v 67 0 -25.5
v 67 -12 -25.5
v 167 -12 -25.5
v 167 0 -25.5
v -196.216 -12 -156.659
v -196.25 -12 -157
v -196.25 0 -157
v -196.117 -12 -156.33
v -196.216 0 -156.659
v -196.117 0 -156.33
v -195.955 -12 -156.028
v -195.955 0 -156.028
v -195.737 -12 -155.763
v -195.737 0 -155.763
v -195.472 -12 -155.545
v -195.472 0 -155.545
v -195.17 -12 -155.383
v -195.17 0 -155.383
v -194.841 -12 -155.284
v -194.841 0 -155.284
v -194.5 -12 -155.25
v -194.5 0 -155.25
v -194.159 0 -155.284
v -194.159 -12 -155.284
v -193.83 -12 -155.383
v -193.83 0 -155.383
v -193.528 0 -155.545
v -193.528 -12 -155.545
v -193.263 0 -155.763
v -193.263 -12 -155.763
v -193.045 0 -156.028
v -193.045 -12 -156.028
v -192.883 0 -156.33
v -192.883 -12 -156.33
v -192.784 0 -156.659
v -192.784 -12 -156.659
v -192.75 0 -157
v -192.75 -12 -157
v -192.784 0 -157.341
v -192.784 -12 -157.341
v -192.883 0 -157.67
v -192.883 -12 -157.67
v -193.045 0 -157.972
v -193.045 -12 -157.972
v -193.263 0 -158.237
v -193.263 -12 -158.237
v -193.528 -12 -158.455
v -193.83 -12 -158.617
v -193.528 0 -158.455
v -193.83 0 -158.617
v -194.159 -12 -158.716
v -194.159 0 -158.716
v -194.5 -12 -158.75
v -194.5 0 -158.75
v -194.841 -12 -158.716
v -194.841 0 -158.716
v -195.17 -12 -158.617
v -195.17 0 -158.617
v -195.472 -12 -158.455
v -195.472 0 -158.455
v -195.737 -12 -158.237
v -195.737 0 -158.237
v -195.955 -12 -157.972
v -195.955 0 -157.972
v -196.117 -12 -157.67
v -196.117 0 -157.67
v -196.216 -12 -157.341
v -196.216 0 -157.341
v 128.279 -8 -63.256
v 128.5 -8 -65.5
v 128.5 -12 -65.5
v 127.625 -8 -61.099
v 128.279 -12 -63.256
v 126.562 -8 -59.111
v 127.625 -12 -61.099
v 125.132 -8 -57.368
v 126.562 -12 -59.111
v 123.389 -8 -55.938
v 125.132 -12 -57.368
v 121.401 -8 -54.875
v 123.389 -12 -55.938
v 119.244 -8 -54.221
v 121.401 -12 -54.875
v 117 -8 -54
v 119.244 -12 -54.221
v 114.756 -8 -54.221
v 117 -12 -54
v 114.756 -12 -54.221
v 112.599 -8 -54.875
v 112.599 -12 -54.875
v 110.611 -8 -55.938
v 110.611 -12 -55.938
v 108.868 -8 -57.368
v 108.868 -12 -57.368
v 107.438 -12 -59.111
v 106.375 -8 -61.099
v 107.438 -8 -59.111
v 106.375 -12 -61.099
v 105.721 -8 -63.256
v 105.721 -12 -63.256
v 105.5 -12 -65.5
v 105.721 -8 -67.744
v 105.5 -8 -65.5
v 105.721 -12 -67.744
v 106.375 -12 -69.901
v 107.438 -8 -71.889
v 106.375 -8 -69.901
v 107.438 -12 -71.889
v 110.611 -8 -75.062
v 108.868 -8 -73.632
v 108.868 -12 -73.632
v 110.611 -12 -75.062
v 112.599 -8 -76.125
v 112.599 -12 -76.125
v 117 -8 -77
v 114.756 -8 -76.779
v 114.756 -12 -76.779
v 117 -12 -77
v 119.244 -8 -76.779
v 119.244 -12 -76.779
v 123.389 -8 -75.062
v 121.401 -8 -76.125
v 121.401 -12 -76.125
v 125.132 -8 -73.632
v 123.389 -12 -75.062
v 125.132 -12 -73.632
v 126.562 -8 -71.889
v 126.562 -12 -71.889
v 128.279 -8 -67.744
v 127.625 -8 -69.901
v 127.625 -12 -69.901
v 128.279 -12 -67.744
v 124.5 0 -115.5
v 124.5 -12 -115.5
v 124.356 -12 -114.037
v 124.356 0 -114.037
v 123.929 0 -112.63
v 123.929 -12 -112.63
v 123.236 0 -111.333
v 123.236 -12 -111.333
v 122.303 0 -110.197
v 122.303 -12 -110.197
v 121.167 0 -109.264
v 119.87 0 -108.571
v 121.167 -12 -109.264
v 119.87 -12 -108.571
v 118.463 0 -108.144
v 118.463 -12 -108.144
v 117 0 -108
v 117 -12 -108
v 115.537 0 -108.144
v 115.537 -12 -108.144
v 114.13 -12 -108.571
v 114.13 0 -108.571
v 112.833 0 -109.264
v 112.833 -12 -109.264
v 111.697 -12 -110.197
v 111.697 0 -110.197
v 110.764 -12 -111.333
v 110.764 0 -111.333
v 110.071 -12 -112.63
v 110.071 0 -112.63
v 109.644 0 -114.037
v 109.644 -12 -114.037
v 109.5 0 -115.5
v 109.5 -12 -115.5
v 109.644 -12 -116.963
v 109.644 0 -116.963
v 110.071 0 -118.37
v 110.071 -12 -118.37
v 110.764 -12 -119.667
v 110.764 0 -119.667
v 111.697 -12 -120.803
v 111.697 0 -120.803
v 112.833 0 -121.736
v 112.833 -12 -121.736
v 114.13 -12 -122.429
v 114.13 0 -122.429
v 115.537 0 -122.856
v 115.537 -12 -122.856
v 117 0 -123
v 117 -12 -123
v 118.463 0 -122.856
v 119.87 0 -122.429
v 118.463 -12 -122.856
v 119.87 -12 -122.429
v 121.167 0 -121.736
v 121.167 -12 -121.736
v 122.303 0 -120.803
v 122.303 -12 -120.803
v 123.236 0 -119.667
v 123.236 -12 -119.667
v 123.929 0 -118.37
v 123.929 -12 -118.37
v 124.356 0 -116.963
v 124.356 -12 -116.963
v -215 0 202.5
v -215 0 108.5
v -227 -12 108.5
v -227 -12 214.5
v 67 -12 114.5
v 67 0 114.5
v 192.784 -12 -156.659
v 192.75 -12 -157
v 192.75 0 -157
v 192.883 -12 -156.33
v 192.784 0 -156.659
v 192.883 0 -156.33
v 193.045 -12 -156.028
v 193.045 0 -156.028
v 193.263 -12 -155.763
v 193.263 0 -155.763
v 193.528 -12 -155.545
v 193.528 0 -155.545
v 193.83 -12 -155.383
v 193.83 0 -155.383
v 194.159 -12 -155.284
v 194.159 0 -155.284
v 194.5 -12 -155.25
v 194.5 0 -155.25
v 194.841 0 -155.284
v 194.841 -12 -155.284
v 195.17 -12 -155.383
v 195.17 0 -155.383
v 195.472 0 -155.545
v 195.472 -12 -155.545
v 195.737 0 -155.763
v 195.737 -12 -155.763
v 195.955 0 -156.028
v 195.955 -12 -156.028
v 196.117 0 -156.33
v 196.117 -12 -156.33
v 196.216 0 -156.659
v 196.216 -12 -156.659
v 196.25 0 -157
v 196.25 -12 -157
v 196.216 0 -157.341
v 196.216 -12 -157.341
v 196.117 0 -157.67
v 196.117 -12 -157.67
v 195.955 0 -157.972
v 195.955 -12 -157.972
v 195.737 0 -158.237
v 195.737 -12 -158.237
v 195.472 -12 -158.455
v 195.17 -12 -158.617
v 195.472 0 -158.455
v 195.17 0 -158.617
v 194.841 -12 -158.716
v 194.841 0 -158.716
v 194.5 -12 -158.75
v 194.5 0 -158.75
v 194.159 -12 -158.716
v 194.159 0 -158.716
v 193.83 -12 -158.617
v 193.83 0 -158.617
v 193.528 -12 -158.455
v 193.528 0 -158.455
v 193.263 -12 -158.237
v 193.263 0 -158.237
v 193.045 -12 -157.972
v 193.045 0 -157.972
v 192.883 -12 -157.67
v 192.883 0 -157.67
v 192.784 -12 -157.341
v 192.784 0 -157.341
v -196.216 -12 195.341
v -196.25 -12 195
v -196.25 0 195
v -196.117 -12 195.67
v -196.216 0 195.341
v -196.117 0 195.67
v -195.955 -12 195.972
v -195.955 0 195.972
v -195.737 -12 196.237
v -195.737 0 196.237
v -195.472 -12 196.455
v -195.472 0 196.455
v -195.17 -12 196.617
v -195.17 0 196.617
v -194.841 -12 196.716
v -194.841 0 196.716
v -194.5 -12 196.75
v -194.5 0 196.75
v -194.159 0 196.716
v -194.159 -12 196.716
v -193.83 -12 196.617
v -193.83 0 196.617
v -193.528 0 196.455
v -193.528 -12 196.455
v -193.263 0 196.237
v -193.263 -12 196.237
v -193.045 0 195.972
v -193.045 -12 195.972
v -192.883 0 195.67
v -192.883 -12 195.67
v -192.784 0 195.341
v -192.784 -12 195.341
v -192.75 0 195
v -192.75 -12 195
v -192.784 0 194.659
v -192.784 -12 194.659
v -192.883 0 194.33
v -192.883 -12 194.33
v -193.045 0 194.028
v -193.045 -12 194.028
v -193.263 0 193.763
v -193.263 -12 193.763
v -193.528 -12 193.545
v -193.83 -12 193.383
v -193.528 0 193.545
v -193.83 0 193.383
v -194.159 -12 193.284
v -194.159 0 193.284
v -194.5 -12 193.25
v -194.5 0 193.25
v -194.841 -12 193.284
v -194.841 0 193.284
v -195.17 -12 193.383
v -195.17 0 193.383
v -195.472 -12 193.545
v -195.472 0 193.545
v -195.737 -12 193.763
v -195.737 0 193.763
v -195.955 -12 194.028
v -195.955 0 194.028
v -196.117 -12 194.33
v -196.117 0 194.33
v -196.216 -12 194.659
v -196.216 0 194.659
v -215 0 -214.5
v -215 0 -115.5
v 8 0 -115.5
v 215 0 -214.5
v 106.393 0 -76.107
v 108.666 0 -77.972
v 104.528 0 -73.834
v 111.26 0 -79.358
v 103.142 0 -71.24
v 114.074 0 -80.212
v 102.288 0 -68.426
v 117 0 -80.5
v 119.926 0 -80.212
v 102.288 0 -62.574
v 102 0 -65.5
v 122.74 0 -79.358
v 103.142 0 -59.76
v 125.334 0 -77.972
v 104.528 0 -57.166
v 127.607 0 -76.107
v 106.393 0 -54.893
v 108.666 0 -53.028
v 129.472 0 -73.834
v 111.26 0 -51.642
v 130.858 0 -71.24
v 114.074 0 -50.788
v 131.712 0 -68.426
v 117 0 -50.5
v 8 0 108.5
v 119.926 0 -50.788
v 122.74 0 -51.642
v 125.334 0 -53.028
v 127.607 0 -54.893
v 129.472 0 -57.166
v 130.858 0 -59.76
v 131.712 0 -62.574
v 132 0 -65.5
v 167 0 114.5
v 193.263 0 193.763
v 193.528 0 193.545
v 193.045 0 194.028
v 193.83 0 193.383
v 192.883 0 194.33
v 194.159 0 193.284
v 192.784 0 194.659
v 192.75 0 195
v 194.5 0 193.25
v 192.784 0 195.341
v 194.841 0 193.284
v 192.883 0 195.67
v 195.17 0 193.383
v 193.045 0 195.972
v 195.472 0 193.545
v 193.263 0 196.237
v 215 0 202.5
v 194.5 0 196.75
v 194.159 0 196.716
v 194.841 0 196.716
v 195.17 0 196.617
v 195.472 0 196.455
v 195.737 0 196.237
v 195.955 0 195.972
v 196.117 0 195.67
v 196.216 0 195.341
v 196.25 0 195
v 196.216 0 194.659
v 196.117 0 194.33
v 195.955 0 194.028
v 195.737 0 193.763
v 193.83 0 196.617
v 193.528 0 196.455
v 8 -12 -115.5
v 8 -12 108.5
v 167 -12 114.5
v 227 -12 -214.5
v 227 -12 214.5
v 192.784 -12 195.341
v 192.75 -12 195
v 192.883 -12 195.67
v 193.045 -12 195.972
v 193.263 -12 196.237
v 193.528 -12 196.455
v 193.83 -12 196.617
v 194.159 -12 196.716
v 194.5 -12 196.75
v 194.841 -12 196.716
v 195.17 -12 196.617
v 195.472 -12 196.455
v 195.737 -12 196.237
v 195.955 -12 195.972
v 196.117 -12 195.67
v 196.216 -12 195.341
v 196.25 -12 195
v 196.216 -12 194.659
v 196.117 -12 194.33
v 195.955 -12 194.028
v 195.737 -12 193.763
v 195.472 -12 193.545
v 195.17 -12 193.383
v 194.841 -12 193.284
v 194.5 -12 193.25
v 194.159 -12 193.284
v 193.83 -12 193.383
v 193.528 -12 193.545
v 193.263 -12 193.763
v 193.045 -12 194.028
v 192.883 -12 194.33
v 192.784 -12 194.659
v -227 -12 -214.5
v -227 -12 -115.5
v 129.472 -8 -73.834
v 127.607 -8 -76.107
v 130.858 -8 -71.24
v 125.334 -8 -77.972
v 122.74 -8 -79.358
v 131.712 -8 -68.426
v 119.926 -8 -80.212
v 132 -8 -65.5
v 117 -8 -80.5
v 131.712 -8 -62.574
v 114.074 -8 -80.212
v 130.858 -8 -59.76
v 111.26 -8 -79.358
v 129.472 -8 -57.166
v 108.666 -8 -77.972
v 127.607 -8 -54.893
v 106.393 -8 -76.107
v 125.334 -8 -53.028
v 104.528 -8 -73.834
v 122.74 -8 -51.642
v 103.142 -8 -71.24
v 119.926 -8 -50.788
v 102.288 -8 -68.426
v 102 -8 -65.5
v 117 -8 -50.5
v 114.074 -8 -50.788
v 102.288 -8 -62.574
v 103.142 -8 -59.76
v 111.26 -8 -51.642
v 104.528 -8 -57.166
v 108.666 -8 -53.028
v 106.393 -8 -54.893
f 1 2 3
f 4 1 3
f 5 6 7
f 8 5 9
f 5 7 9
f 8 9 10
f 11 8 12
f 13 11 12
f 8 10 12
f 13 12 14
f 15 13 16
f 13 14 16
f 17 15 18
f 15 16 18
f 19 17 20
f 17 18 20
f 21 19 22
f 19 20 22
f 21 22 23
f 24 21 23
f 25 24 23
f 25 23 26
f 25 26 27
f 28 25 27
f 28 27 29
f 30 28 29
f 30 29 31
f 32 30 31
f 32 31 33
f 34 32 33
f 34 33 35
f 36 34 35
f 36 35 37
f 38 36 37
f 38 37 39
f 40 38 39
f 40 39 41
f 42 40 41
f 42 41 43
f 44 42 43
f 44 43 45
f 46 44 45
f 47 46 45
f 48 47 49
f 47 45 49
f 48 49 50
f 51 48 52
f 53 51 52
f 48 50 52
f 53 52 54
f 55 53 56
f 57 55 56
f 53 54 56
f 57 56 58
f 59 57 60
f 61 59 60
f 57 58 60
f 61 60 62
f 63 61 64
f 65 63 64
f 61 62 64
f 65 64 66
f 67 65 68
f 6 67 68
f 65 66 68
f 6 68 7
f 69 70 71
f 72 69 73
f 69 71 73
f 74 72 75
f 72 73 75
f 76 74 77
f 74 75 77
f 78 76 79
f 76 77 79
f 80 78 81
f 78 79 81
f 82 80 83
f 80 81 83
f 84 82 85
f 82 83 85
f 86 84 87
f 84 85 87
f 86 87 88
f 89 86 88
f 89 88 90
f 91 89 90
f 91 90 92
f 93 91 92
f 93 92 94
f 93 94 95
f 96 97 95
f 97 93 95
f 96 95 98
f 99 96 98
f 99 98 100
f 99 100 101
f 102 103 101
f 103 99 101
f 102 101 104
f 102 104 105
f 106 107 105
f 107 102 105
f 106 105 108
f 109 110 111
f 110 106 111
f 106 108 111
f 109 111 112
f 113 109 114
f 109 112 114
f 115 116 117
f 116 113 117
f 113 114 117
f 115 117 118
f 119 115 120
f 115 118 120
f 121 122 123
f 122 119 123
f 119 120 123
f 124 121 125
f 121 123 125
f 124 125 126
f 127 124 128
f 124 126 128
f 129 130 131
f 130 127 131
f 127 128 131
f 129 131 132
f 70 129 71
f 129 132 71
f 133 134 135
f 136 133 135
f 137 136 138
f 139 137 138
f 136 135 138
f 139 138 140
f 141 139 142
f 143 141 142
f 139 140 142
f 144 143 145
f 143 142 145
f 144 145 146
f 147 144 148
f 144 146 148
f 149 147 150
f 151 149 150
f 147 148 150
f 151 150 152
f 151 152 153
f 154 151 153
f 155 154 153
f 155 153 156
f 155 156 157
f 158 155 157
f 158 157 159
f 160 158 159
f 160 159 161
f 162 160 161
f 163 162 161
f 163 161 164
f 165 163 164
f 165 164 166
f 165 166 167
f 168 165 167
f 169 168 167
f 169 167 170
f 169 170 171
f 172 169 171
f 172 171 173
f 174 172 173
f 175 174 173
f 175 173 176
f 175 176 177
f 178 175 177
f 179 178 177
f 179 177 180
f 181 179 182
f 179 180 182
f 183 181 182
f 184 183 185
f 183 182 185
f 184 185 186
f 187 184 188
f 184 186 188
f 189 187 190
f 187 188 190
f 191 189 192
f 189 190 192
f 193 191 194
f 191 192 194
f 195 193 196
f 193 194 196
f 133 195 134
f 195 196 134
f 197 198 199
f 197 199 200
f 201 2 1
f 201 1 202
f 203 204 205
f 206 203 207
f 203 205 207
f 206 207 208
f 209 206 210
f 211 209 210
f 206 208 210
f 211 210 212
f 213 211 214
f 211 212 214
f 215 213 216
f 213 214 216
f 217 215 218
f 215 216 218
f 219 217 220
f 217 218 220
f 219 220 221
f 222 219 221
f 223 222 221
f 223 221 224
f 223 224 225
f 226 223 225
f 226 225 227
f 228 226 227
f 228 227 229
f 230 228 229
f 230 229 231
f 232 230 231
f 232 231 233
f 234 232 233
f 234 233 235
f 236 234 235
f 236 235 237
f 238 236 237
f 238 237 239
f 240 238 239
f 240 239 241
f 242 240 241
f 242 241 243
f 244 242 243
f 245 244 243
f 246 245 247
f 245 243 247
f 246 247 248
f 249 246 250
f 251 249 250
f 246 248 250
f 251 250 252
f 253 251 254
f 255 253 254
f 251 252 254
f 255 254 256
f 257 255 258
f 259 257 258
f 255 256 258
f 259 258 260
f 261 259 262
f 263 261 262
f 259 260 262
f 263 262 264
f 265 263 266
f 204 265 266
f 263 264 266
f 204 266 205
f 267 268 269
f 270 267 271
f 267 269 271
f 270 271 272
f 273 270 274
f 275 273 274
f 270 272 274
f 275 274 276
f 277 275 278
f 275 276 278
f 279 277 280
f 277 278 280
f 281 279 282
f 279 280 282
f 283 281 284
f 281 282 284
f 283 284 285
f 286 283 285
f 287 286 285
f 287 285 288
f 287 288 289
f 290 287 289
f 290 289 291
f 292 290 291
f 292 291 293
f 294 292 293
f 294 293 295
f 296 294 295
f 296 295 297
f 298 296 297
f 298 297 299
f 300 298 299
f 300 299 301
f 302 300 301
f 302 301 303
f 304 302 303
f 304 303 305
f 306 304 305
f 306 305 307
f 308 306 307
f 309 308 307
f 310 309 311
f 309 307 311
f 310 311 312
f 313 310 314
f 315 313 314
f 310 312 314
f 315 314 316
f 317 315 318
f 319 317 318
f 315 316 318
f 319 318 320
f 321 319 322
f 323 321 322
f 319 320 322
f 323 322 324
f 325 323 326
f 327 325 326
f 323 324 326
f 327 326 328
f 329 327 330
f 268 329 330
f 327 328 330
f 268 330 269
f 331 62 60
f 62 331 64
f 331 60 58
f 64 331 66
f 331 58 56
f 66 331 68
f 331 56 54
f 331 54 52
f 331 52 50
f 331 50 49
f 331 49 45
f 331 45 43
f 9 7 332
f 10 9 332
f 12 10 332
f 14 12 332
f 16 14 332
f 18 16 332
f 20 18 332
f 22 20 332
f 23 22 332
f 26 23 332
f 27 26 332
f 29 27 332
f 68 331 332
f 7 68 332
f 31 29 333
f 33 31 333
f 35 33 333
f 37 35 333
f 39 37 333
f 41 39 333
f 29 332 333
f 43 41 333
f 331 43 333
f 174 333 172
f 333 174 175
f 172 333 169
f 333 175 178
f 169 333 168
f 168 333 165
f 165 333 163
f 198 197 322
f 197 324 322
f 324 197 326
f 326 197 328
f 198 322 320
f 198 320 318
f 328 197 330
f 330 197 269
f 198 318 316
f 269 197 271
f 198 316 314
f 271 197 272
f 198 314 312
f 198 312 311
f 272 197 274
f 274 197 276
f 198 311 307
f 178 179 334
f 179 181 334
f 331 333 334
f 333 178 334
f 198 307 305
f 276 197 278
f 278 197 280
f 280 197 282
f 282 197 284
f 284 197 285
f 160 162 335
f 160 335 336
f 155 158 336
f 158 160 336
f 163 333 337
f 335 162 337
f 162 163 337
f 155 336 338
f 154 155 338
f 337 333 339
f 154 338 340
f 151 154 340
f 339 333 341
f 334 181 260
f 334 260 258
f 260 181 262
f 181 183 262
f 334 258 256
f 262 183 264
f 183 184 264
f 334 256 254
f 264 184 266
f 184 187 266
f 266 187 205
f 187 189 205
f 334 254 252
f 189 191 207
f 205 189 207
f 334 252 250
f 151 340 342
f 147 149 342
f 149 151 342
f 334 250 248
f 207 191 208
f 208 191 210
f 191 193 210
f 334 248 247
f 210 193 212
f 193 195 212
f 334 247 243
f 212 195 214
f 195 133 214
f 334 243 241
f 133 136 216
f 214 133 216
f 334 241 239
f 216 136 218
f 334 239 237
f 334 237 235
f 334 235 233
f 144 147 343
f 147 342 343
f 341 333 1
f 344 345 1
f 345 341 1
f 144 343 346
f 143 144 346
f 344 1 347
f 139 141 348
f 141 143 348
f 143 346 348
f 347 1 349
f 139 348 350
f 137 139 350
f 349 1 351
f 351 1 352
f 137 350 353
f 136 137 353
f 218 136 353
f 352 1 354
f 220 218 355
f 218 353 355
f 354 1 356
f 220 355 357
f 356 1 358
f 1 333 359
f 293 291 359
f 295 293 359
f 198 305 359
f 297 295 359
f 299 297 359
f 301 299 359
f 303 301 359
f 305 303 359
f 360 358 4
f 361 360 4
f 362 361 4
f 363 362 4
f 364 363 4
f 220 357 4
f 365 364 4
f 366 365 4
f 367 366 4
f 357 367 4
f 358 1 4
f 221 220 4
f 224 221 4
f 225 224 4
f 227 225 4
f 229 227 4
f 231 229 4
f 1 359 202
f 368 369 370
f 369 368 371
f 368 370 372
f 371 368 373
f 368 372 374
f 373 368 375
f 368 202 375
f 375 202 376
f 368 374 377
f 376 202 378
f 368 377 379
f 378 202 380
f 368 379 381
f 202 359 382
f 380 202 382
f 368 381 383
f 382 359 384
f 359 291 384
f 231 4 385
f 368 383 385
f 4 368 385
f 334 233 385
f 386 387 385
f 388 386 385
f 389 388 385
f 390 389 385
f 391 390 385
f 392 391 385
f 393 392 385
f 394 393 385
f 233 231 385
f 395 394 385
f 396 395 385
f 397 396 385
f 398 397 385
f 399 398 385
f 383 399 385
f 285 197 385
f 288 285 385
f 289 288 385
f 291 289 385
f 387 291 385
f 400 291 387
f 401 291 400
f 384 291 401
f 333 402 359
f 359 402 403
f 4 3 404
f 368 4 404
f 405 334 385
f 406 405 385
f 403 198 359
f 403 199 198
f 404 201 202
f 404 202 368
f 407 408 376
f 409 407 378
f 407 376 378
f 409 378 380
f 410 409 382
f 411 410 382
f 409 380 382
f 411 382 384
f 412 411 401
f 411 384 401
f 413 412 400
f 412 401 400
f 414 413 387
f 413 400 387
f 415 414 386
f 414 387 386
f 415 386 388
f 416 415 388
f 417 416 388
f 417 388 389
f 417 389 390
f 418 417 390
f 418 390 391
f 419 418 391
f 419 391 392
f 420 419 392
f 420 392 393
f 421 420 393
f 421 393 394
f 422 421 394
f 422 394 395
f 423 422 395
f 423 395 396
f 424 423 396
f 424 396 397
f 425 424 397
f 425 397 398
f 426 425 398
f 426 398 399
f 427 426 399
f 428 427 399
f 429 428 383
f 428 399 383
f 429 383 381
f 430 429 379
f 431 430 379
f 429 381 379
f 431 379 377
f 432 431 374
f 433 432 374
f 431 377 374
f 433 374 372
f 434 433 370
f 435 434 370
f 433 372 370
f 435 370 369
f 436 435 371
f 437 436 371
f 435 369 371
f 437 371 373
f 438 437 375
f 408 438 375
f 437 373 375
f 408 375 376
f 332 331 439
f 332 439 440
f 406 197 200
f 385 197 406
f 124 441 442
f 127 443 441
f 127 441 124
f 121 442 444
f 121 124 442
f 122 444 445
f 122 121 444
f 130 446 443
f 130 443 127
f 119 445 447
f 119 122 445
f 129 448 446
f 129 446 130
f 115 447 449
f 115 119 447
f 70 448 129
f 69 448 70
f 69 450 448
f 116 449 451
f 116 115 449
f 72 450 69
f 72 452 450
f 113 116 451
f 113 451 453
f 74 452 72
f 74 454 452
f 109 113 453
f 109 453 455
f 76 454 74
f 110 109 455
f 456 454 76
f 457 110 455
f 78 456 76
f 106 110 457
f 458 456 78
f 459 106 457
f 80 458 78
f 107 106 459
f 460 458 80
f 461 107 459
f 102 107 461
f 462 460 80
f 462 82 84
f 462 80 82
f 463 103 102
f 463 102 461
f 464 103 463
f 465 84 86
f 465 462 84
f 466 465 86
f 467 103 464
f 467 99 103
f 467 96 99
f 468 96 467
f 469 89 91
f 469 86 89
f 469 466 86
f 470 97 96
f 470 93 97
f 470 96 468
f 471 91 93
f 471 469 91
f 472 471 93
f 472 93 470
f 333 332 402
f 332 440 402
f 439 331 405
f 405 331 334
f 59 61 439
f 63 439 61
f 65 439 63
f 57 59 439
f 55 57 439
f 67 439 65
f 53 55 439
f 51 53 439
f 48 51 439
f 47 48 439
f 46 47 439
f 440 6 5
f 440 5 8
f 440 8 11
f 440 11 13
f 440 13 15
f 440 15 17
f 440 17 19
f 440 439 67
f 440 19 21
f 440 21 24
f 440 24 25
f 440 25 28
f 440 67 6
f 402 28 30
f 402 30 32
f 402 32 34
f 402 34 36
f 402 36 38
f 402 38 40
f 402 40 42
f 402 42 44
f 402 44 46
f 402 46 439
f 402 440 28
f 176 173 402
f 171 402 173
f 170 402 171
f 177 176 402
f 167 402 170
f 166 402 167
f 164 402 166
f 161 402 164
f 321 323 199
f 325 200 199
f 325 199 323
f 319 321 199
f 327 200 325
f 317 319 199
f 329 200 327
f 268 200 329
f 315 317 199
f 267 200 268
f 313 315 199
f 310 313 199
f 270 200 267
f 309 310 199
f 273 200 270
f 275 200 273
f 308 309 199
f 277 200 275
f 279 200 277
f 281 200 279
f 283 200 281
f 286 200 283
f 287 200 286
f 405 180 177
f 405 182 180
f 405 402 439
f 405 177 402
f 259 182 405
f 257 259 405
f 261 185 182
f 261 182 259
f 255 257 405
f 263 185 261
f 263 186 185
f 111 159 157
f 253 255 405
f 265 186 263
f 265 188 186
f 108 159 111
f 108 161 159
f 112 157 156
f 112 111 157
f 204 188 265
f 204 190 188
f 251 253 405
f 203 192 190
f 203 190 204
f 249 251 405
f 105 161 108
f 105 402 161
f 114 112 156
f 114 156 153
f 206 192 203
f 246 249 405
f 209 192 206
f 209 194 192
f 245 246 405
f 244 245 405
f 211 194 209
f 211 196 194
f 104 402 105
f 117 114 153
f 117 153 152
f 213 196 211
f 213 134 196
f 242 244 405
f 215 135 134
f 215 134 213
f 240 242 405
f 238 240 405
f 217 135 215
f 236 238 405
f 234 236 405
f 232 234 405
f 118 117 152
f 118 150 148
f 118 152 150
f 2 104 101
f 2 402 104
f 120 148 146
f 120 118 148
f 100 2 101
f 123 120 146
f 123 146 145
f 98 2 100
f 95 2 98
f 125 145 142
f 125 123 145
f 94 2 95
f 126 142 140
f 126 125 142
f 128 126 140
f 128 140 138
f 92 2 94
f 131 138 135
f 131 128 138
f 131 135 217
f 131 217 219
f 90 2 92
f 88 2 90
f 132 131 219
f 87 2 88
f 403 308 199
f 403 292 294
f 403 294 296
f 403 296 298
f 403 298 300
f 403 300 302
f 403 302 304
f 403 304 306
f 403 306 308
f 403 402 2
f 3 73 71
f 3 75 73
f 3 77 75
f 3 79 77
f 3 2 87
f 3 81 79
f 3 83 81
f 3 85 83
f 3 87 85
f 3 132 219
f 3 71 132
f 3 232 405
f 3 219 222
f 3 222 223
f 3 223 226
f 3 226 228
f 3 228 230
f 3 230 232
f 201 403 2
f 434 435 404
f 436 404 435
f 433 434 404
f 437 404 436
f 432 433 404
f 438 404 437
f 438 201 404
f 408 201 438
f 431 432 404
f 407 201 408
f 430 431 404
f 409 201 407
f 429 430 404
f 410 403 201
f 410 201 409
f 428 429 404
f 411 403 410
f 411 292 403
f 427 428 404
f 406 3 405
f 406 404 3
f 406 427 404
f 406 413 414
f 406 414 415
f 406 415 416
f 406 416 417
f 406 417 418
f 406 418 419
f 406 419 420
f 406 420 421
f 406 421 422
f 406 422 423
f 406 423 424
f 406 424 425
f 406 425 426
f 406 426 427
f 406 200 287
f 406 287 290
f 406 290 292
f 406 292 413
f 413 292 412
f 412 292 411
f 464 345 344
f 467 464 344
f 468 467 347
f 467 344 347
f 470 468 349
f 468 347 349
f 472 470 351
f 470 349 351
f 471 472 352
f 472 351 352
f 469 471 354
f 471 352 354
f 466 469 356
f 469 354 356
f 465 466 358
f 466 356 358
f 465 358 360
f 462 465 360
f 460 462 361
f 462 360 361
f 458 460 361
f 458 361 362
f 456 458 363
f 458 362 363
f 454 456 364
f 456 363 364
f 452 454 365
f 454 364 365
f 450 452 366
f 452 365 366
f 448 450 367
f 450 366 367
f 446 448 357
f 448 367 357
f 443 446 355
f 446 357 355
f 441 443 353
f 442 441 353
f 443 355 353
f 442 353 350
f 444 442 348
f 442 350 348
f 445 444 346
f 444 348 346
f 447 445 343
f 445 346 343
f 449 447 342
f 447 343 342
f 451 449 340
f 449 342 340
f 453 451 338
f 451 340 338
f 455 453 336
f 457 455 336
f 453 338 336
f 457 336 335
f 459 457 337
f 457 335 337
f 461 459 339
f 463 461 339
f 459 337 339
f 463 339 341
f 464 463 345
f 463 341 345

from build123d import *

# Parameters (mm, degrees)
F0_W     = 454
F0_H     = 429
F1_DEPTH = 12
F2_SIZE  = 11.99999
F3_W     = 235
F3_H     = 224
F3_W_2   = 100
F3_H_2   = 140
F3_R     = 11.5
F3_R_2   = 7.5
F4_DEPTH = 25
F6_D     = 3.5
F7_R     = 15
F7_R_2   = 11.5
F8_DEPTH = 8


# Not quite as in the source:
# - a fillet or chamfer is up to 0.001 mm smaller than in the source, because OpenCascade refuses the exact size


with BuildPart() as f1:
    # F0 (on Front) → F1 (new body)
    with BuildSketch(Plane.XZ):
        Rectangle(F0_W, F0_H)
    extrude(amount=F1_DEPTH)

    # F2 (size 12 in the source; OpenCascade refuses exactly that, so slightly less here)
    f2_edges = [f1.edges().sort_by_distance(p)[0] for p in [
        (227, 0, 0),
        (-227, 0, 0),
        (0, 0, 214.5),
    ]]
    chamfer(f2_edges, length=F2_SIZE)

    # F3 (on face) → F4 (cut)
    with BuildSketch(Plane.XZ.offset(12)):
        with Locations((-109.5, -3.5)):
            Rectangle(F3_W, F3_H)
        with Locations((117, 44.5)):
            Rectangle(F3_W_2, F3_H_2)
        with Locations((117, -65.5)):
            Circle(F3_R)
        with Locations((117, -115.5)):
            Circle(F3_R_2)
    extrude(amount=-F4_DEPTH, mode=Mode.SUBTRACT)

    # F6 (through all)
    with Locations(Plane.XZ.offset(12)):
        with Locations((-194.5, 195), (194.5, 195), (194.5, -157), (-194.5, -157)):
            Hole(F6_D / 2)

    # F7 (on face) → F8 (cut)
    with BuildSketch(Plane(origin=(0, 0, 0), x_dir=(-1, 0, 0), z_dir=(0, 1, 0))):
        with Locations((-117, -65.5)):
            Circle(F7_R)
        with Locations((-117, -65.5)):
            Circle(F7_R_2, mode=Mode.SUBTRACT)
    extrude(amount=-F8_DEPTH, mode=Mode.SUBTRACT)


solid = f1.part
